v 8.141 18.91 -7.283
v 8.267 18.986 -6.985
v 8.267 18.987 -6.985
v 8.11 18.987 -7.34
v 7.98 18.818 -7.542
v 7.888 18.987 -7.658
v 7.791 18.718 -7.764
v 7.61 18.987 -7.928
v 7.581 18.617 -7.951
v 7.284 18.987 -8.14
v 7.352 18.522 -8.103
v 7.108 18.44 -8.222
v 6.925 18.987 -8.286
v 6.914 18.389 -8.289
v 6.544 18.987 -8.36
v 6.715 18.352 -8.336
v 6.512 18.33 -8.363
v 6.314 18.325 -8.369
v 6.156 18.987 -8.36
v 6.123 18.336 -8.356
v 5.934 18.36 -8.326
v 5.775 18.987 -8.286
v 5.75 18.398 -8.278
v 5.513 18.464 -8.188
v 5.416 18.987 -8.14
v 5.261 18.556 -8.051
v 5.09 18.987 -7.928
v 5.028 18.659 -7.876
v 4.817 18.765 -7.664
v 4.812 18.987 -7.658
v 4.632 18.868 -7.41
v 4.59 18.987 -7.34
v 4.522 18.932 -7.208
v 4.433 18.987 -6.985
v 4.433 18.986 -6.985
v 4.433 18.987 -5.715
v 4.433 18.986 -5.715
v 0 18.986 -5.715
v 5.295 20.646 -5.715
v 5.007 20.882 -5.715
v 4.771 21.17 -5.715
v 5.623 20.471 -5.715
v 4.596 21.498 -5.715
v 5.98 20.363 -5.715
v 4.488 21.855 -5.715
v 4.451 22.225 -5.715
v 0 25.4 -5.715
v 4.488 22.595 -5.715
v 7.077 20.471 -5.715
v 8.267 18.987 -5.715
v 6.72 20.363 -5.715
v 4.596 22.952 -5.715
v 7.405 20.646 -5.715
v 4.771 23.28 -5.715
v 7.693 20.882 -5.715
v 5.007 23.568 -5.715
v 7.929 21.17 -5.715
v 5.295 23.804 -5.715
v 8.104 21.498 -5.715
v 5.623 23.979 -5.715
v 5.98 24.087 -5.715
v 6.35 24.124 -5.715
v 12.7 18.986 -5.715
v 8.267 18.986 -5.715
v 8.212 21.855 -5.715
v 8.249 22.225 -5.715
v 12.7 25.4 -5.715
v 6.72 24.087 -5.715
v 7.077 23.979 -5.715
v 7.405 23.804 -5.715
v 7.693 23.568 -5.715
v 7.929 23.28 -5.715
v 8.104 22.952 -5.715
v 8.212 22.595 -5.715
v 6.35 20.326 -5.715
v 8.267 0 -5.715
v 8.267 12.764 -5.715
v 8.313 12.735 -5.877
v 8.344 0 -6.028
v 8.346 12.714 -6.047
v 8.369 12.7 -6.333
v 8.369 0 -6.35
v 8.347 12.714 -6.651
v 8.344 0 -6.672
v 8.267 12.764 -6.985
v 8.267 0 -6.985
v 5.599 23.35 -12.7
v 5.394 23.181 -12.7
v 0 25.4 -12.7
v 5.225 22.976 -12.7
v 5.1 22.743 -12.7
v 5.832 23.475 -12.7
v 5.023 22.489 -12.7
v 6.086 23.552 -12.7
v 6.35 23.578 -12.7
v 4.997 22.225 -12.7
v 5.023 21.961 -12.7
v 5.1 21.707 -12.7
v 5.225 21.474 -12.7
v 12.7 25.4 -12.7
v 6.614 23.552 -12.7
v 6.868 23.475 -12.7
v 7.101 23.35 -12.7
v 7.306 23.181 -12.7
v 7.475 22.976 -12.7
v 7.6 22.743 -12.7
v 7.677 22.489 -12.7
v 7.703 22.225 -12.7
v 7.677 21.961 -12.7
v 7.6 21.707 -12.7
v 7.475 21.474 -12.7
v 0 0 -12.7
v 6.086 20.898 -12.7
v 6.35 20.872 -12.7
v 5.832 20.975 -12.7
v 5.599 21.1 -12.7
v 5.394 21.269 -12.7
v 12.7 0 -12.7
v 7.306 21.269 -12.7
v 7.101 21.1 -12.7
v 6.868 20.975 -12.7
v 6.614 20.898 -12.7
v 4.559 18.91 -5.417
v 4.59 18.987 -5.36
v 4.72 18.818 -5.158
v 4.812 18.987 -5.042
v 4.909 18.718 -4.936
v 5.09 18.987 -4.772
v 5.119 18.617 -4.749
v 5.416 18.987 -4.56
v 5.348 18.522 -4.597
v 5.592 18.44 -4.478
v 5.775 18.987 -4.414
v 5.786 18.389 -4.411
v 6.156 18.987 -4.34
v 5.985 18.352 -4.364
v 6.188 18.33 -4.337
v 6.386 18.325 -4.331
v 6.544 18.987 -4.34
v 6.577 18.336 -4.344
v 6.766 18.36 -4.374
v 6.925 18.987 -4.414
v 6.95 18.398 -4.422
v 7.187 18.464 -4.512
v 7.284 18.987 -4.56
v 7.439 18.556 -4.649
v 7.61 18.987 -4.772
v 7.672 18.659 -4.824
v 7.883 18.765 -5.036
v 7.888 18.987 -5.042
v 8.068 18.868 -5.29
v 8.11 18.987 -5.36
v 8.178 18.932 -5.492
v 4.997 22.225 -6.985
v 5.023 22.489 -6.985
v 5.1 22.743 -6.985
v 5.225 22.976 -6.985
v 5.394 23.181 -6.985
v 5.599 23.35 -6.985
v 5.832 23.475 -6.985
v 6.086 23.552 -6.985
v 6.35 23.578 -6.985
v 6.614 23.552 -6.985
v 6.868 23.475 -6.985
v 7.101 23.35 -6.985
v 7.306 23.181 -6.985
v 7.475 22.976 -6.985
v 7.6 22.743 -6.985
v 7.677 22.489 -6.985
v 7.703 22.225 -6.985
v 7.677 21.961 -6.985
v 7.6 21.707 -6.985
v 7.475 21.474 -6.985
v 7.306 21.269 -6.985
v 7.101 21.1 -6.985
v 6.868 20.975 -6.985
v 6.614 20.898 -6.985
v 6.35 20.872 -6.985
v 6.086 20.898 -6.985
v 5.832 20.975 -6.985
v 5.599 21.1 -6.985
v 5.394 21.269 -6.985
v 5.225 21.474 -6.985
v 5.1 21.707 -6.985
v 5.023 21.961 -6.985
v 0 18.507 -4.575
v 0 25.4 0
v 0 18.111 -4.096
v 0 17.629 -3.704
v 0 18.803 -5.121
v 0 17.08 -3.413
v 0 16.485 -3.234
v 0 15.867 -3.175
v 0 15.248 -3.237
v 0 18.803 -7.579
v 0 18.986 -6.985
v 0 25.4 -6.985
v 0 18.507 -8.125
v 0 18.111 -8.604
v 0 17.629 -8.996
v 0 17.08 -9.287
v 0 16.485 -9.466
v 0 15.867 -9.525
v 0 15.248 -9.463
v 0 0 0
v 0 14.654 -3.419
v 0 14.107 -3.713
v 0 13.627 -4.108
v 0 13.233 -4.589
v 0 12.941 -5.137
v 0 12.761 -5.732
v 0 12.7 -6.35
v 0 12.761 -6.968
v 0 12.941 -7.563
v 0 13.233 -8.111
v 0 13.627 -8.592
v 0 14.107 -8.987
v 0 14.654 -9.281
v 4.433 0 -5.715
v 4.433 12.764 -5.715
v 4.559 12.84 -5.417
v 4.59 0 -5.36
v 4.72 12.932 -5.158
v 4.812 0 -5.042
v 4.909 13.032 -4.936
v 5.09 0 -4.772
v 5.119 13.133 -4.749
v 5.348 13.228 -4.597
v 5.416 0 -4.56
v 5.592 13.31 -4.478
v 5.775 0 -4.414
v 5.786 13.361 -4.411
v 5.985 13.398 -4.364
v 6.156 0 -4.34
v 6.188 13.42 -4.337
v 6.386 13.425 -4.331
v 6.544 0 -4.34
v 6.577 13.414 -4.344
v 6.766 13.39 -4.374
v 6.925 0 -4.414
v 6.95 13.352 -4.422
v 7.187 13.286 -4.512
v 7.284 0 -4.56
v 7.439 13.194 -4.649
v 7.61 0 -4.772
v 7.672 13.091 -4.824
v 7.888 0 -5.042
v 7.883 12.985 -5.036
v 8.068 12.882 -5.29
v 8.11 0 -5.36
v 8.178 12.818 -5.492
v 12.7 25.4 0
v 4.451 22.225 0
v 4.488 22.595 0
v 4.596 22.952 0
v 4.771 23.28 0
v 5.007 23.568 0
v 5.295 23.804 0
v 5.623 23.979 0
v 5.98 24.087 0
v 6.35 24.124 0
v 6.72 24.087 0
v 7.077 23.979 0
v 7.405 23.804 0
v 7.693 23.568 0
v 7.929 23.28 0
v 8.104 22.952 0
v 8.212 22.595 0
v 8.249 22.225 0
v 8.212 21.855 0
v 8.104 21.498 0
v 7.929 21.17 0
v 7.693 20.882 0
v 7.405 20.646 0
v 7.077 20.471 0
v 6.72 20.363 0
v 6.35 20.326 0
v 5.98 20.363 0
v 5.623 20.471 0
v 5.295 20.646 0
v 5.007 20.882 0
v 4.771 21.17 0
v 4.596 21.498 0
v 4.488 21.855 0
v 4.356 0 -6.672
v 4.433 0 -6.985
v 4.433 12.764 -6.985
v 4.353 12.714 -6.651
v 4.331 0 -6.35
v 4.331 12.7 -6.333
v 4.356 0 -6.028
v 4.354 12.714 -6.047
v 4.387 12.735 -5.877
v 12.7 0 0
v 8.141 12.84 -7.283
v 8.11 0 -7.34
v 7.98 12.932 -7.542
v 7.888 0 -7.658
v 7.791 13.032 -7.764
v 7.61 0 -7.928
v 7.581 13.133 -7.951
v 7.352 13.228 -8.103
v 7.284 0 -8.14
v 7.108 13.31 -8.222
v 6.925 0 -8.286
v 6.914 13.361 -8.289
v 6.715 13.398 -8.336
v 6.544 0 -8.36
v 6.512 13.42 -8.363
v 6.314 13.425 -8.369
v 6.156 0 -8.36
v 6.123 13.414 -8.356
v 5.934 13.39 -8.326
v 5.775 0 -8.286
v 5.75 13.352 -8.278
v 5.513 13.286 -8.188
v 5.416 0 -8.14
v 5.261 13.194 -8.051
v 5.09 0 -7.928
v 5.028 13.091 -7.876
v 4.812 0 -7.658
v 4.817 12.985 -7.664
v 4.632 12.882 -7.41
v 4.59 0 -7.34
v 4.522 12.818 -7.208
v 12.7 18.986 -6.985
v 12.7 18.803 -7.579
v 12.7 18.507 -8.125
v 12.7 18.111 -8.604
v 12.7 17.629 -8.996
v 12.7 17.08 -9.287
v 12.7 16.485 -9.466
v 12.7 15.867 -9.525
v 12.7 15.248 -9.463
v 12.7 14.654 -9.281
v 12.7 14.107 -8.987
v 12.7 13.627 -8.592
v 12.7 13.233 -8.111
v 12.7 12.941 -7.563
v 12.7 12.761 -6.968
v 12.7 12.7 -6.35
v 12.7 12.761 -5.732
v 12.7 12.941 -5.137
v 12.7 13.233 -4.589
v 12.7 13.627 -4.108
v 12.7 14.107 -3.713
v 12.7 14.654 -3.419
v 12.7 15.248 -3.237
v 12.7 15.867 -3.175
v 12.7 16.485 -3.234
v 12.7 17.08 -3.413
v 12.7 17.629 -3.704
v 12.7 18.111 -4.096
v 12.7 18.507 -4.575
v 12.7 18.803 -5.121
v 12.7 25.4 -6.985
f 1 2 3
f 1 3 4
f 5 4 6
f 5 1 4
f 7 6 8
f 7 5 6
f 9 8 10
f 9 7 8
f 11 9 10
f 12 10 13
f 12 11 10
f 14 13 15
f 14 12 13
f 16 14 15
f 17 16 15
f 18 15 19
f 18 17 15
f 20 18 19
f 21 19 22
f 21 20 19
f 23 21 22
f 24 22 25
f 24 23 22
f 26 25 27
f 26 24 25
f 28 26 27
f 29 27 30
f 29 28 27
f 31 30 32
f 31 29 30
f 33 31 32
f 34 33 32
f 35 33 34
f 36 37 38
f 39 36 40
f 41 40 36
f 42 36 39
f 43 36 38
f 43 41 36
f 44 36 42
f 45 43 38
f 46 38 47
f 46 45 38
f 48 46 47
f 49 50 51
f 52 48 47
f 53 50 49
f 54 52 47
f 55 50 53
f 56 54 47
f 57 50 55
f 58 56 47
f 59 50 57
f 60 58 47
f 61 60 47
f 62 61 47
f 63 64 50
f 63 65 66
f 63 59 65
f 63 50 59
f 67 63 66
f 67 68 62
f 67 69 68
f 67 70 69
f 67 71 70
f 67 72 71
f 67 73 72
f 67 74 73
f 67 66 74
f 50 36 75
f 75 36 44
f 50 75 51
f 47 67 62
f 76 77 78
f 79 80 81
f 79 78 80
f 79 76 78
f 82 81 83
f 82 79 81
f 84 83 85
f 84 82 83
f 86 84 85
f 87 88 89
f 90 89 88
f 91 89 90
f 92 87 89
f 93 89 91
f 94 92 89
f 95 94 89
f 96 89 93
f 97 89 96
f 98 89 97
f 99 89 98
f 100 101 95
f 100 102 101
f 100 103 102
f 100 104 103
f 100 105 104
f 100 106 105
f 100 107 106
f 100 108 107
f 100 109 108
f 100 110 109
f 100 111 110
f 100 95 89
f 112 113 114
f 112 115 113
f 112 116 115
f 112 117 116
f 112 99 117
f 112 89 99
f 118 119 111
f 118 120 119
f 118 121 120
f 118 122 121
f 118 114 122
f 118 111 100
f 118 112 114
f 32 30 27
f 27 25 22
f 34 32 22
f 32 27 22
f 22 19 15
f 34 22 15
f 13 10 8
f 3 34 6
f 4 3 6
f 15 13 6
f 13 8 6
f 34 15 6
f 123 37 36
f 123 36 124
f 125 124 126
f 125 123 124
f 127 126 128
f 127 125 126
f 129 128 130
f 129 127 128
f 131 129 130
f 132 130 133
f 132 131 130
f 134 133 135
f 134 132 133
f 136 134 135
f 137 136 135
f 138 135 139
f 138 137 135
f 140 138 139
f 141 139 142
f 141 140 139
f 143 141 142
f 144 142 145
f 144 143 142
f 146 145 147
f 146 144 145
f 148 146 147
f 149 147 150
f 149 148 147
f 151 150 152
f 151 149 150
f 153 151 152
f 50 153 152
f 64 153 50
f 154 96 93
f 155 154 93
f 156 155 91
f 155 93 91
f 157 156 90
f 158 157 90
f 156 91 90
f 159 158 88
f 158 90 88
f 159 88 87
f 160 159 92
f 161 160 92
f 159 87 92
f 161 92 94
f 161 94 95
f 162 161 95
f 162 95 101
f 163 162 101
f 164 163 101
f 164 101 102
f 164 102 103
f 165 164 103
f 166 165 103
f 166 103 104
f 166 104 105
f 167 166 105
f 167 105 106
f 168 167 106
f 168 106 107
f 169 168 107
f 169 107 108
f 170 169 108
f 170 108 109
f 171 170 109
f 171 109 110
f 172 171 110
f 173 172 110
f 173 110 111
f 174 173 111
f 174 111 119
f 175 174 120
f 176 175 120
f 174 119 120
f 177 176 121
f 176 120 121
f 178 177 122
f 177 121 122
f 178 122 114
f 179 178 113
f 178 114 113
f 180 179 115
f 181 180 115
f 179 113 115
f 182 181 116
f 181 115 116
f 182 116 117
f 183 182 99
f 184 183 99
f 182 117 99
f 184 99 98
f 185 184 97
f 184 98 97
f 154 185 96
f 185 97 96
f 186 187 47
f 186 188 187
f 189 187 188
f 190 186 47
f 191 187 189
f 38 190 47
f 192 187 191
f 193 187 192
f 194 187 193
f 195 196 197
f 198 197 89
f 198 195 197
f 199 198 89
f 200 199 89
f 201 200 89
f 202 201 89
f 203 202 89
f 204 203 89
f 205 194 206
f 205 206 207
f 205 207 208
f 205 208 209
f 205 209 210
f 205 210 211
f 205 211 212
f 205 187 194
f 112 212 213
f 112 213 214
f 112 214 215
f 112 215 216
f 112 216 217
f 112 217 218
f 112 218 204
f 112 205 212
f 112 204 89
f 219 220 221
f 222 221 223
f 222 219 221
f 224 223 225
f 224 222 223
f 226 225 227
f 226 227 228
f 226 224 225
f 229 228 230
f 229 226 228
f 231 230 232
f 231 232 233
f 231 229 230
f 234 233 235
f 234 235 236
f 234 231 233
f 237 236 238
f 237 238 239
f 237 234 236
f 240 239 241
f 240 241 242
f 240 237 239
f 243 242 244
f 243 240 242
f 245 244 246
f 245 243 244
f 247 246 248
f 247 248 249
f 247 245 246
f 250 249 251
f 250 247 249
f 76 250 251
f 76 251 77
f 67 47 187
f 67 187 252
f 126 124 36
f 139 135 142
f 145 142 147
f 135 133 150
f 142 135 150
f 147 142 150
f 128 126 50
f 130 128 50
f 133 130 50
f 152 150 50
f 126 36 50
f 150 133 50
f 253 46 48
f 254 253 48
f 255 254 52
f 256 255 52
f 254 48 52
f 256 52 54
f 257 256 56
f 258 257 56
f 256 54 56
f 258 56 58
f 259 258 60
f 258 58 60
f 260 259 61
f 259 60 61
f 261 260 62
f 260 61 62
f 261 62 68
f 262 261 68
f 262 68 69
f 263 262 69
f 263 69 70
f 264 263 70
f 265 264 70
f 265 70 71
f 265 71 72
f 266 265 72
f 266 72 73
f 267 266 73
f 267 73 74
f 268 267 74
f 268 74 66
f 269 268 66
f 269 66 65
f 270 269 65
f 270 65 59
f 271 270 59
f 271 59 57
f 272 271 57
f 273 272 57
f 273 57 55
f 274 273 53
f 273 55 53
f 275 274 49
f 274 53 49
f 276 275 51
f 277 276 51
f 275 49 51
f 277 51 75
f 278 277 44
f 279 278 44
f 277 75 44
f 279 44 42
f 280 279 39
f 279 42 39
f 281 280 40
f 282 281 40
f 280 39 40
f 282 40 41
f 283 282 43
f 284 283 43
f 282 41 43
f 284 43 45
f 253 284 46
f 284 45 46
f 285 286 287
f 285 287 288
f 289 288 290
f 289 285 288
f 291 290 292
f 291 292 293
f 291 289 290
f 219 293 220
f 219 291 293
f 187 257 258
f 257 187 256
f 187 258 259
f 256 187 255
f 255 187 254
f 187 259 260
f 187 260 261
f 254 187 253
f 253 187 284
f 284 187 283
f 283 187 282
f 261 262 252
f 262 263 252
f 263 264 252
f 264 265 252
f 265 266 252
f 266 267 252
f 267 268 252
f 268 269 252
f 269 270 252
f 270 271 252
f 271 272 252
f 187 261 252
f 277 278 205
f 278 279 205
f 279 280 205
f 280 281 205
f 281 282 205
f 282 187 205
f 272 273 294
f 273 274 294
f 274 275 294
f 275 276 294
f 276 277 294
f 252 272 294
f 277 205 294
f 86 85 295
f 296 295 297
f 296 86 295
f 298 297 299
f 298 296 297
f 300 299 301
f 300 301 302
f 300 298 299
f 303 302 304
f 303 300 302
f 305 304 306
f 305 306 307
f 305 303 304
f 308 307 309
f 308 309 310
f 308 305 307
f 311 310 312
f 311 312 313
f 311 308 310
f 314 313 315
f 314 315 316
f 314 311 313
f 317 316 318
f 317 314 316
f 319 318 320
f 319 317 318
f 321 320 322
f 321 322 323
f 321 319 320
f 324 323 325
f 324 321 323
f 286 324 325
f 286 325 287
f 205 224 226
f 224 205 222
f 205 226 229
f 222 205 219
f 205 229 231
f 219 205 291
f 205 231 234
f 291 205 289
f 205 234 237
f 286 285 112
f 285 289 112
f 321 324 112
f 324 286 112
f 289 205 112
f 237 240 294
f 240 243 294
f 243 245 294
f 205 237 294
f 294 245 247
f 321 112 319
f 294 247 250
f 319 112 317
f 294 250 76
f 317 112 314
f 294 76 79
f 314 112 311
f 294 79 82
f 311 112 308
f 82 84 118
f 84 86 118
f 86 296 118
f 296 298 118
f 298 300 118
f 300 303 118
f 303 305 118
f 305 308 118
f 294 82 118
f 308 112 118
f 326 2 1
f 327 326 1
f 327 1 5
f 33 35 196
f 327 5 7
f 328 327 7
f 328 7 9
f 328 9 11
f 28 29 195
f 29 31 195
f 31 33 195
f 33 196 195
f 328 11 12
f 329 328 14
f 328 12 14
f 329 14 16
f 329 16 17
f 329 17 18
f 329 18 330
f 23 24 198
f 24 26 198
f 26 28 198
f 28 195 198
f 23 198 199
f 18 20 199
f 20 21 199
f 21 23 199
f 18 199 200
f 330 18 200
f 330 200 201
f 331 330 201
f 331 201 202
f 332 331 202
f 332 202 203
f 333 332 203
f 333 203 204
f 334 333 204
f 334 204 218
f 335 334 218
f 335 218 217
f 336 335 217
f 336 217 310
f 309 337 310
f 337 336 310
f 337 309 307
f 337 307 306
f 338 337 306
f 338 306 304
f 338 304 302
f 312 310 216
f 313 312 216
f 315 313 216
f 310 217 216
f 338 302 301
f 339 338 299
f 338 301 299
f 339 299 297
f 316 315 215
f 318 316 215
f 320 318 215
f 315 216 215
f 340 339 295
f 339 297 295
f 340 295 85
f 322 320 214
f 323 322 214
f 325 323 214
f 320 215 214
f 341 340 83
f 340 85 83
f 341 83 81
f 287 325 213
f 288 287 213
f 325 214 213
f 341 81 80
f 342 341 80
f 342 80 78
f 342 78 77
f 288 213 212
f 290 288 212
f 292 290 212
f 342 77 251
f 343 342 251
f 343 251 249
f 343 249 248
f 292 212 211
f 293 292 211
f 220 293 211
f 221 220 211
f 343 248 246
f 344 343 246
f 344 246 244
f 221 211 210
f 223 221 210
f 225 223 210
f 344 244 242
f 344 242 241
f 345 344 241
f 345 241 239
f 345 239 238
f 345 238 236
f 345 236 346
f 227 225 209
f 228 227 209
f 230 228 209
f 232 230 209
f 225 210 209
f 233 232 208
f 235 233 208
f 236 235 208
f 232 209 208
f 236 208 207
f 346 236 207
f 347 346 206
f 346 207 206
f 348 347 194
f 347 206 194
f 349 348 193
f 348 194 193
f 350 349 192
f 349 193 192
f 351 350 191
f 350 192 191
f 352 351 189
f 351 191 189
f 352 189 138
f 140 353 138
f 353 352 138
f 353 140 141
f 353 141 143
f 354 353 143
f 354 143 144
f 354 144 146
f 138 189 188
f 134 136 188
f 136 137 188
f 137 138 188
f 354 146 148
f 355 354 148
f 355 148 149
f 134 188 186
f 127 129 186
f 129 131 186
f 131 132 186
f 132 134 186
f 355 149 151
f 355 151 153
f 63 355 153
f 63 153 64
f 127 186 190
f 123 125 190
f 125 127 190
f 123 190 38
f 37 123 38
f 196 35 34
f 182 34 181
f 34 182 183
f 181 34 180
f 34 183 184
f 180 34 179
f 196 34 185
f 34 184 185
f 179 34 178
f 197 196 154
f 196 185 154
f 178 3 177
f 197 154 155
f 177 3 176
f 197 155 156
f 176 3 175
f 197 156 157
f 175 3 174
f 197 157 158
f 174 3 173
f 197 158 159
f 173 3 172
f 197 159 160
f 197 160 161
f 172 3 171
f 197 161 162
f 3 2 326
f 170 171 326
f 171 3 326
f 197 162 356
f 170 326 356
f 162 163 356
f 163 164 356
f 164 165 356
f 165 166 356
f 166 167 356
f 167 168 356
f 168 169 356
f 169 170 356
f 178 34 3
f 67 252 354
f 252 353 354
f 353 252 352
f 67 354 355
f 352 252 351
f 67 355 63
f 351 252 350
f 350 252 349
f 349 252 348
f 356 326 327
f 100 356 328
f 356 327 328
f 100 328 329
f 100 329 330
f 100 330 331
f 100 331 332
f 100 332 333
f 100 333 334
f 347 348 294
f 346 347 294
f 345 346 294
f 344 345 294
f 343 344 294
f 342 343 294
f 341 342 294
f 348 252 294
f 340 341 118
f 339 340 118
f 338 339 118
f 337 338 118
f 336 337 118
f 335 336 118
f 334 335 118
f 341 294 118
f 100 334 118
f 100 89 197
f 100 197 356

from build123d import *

# Parameters (mm, degrees)
SKETCH1_W                      = 12.7
SKETCH1_H                      = 12.7
BOSS_EXTRUDE1_DEPTH            = 25.4
F_1_4_0_25_DIAMETER_HOLE1_D    = 6.35
SKETCH4_W                      = 1.27
SKETCH4_H                      = 7.62
CUT_EXTRUDE1_DEPTH             = 32.108519733
TAP_DRILL_FOR_10_32_TAP1_DEPTH = 18.986851973
F_6_CLEARANCE_HOLE1_D          = 3.7973
F_6_CLEARANCE_HOLE1_DEPTH      = 5.715
TAP_DRILL_FOR_6_32_TAP1_D      = 2.7051


# Read off the part's stored shape, not the designer's step: Tap Drill for #10-32 Tap1
with BuildPart() as part:
    # Sketch1 → Boss-Extrude1 (new body)
    with BuildSketch(Plane(origin=(0, 0, 0), x_dir=(1, 0, 0), z_dir=(0, 1, 0))):
        with Locations((6.35, 6.35)):
            Rectangle(SKETCH1_W, SKETCH1_H)
    extrude(amount=BOSS_EXTRUDE1_DEPTH)

    # 1/4 (0.25) Diameter Hole1 (through all)
    with Locations(Plane(origin=(12.7, 0, 0), x_dir=(0, 0, -1), z_dir=(1, 0, 0))):
        with Locations((6.35, 15.875)):
            Hole(F_1_4_0_25_DIAMETER_HOLE1_D / 2)

    # Sketch4 → Cut-Extrude1 (cut, through all)
    with BuildSketch(Plane(origin=(12.7, 0, 0), x_dir=(0, 0, -1), z_dir=(1, 0, 0))):
        with Locations((6.35, 21.59)):
            Rectangle(SKETCH4_W, SKETCH4_H)
    extrude(amount=-CUT_EXTRUDE1_DEPTH, mode=Mode.SUBTRACT)

    # Tap Drill for #10-32 Tap1 outline → Tap Drill for #10-32 Tap1 (cut)
    with BuildSketch(Plane(origin=(0, 0, 0), x_dir=(1, 0, 0), z_dir=(0, 1, 0))):
        with BuildLine():
            ThreePointArc((8.266858756, 5.715), (8.3693, 6.35), (8.266858756, 6.985))
            ThreePointArc((8.266858756, 6.985), (6.35, 8.3693), (4.433141244, 6.985))
            ThreePointArc((4.433141244, 6.985), (4.3307, 6.35), (4.433141244, 5.715))
            ThreePointArc((4.433141244, 5.715), (6.35, 4.3307), (8.266858756, 5.715))
        make_face()
    extrude(amount=TAP_DRILL_FOR_10_32_TAP1_DEPTH, mode=Mode.SUBTRACT)

    # #6 Clearance Hole1
    with Locations(Plane.XY):
        with Locations((6.35, 22.225)):
            Hole(F_6_CLEARANCE_HOLE1_D / 2, depth=F_6_CLEARANCE_HOLE1_DEPTH)

    # Tap Drill for #6-32 Tap1 (through all)
    with Locations(Plane.XY.offset(-6.985)):
        with Locations((6.35, 22.225)):
            Hole(TAP_DRILL_FOR_6_32_TAP1_D / 2)


solid = part.part
